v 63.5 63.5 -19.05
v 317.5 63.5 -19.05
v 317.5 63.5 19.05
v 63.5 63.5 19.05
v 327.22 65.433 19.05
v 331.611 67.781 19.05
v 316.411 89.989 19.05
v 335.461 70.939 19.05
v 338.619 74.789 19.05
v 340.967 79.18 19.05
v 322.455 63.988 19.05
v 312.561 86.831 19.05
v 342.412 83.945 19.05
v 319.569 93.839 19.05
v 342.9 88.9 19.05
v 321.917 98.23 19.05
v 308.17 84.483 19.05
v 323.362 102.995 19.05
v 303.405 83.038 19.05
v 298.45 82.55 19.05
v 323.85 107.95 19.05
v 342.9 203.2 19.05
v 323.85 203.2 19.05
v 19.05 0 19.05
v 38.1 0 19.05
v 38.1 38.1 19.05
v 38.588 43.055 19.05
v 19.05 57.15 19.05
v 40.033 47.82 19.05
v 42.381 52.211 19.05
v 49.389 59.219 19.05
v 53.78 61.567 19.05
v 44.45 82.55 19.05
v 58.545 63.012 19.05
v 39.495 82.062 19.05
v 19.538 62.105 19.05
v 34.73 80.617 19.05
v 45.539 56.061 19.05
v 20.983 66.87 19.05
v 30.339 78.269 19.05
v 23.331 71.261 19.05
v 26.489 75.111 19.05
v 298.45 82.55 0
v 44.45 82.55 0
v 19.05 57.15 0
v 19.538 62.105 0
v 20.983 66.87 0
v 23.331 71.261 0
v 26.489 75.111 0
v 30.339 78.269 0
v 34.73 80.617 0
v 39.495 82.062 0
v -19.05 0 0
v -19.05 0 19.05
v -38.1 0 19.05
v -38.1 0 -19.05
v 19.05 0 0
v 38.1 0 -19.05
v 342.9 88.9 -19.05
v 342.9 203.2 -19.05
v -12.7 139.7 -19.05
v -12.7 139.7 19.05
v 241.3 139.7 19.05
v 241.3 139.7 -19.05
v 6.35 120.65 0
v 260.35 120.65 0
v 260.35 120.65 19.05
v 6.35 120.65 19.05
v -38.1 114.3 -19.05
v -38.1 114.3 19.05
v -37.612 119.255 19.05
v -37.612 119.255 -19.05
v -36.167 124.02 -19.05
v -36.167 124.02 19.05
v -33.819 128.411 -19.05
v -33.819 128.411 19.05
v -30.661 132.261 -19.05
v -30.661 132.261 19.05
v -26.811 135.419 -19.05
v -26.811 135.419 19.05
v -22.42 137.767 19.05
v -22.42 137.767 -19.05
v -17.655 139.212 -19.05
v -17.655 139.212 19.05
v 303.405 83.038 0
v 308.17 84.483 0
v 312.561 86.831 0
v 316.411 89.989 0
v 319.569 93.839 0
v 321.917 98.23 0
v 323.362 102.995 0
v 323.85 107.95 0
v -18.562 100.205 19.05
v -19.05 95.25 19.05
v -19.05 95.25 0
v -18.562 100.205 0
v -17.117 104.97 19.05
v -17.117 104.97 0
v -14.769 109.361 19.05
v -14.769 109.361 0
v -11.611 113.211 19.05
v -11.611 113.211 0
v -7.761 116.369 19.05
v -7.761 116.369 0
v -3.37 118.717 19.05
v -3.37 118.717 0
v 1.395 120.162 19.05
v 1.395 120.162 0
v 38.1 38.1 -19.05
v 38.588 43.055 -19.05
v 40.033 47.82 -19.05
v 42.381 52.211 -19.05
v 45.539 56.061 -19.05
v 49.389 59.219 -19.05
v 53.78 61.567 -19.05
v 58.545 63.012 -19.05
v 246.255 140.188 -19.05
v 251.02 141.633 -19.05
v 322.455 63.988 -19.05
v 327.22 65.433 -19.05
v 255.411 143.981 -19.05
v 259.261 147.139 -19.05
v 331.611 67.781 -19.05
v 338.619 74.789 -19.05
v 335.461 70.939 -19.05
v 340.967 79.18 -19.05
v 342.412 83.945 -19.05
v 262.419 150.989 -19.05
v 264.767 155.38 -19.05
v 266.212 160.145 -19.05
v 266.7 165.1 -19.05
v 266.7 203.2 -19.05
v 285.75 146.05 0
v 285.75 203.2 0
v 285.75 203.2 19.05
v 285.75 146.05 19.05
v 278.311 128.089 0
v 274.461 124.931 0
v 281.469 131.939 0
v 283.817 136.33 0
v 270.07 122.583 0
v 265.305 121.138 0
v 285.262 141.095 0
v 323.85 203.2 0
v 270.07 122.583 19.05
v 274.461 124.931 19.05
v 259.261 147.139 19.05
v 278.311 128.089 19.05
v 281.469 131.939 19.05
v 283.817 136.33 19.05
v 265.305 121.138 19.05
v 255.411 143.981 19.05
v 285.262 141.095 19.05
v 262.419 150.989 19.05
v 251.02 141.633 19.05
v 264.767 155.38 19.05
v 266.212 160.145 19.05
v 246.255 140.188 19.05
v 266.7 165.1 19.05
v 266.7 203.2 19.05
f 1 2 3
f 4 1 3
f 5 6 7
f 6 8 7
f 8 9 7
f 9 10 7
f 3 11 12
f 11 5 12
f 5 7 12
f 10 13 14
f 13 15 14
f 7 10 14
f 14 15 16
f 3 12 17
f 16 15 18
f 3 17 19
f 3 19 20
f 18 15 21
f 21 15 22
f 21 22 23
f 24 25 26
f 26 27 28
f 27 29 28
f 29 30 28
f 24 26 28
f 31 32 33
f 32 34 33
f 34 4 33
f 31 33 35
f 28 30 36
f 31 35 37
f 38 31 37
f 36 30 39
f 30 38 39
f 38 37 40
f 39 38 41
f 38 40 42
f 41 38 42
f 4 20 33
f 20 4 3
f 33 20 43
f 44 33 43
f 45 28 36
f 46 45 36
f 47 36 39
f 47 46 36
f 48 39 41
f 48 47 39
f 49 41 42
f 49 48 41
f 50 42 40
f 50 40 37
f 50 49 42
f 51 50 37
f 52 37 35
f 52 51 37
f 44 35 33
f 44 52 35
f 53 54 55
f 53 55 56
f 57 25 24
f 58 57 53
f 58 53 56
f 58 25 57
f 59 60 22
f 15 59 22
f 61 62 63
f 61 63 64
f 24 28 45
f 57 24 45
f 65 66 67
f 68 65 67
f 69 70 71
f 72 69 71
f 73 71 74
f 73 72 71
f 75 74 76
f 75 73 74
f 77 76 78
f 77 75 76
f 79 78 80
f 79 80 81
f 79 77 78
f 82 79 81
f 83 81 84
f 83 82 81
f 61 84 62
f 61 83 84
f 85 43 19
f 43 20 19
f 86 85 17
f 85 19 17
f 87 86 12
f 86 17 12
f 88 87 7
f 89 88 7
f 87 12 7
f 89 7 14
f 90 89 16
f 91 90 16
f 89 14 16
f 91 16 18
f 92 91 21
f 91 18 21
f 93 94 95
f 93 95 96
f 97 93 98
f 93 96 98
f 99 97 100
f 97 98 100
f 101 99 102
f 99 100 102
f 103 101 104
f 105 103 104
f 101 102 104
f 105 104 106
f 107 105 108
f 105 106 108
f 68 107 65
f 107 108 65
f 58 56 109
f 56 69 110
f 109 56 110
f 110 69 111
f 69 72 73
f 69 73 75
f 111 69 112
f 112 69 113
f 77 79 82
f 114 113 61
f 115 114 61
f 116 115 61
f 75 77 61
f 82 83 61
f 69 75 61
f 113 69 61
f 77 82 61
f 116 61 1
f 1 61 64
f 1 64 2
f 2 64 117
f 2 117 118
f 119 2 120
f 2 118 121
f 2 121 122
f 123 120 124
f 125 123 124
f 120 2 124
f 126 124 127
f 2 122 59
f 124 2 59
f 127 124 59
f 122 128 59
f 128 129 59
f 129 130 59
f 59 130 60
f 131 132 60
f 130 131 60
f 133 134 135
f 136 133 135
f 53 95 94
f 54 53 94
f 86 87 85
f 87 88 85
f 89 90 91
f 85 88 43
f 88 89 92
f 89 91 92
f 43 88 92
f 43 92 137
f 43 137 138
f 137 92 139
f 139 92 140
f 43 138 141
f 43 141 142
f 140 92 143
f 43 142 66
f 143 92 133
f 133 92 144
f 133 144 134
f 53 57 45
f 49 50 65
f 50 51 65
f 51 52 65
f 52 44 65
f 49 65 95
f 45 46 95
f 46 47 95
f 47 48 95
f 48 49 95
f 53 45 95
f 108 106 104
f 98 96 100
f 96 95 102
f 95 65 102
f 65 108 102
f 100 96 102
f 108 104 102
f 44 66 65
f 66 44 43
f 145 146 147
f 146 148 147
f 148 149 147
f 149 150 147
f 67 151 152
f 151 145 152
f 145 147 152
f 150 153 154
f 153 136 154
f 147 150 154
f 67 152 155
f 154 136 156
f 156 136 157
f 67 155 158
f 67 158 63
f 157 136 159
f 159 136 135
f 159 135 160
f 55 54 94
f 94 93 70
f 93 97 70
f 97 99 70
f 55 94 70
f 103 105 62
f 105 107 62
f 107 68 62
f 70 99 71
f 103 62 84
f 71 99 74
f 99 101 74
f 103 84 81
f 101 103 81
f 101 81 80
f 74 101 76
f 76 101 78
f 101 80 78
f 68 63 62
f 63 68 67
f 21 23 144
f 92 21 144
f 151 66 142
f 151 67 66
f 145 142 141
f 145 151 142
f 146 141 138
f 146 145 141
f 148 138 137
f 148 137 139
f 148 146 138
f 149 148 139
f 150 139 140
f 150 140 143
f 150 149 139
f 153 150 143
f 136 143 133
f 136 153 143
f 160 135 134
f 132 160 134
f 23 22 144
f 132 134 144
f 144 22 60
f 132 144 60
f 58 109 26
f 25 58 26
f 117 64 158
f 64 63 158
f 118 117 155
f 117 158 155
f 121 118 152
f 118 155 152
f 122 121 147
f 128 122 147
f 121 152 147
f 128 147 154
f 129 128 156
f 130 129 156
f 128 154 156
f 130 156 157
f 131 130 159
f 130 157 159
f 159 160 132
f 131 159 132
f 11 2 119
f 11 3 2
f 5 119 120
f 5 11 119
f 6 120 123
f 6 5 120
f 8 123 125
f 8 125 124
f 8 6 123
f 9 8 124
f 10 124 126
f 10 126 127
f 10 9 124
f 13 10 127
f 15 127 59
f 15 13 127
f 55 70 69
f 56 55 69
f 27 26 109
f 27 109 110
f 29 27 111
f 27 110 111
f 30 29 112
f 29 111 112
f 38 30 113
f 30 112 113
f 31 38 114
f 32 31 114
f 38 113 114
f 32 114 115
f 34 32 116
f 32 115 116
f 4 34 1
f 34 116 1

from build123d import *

# Parameters (mm, degrees)
F3_R = 25.4


with BuildPart() as f2:
    # F2: sweep along a path in F1
    with BuildLine(Plane.XY) as f2_path:
        Line((0, 0), (0, 101.6))
        Line((0, 101.6), (304.8, 101.6))
        Line((304.8, 101.6), (304.8, 203.2))
    # F0 (on Front) → F2 (sweep)
    with BuildSketch(Plane.XZ):
        Polygon((-19.05, 19.05), (-38.1, 19.05), (-38.1, -19.05), (38.1, -19.05), (38.1, 19.05), (19.05, 19.05), (19.05, 0), (-19.05, 0), align=None)
    sweep(path=f2_path.line, transition=Transition.RIGHT)

    # F3
    f3_edges = [f2.edges().sort_by_distance(p)[0] for p in [
        (342.9, 63.5, 0),
        (38.1, 63.5, 0),
        (-38.1, 139.7, 0),
        (266.7, 139.7, 0),
        (-19.05, 120.65, 9.525),
        (285.75, 120.65, 9.525),
        (19.05, 82.55, 9.525),
        (323.85, 82.55, 9.525),
    ]]
    fillet(f3_edges, radius=F3_R)


solid = f2.part
